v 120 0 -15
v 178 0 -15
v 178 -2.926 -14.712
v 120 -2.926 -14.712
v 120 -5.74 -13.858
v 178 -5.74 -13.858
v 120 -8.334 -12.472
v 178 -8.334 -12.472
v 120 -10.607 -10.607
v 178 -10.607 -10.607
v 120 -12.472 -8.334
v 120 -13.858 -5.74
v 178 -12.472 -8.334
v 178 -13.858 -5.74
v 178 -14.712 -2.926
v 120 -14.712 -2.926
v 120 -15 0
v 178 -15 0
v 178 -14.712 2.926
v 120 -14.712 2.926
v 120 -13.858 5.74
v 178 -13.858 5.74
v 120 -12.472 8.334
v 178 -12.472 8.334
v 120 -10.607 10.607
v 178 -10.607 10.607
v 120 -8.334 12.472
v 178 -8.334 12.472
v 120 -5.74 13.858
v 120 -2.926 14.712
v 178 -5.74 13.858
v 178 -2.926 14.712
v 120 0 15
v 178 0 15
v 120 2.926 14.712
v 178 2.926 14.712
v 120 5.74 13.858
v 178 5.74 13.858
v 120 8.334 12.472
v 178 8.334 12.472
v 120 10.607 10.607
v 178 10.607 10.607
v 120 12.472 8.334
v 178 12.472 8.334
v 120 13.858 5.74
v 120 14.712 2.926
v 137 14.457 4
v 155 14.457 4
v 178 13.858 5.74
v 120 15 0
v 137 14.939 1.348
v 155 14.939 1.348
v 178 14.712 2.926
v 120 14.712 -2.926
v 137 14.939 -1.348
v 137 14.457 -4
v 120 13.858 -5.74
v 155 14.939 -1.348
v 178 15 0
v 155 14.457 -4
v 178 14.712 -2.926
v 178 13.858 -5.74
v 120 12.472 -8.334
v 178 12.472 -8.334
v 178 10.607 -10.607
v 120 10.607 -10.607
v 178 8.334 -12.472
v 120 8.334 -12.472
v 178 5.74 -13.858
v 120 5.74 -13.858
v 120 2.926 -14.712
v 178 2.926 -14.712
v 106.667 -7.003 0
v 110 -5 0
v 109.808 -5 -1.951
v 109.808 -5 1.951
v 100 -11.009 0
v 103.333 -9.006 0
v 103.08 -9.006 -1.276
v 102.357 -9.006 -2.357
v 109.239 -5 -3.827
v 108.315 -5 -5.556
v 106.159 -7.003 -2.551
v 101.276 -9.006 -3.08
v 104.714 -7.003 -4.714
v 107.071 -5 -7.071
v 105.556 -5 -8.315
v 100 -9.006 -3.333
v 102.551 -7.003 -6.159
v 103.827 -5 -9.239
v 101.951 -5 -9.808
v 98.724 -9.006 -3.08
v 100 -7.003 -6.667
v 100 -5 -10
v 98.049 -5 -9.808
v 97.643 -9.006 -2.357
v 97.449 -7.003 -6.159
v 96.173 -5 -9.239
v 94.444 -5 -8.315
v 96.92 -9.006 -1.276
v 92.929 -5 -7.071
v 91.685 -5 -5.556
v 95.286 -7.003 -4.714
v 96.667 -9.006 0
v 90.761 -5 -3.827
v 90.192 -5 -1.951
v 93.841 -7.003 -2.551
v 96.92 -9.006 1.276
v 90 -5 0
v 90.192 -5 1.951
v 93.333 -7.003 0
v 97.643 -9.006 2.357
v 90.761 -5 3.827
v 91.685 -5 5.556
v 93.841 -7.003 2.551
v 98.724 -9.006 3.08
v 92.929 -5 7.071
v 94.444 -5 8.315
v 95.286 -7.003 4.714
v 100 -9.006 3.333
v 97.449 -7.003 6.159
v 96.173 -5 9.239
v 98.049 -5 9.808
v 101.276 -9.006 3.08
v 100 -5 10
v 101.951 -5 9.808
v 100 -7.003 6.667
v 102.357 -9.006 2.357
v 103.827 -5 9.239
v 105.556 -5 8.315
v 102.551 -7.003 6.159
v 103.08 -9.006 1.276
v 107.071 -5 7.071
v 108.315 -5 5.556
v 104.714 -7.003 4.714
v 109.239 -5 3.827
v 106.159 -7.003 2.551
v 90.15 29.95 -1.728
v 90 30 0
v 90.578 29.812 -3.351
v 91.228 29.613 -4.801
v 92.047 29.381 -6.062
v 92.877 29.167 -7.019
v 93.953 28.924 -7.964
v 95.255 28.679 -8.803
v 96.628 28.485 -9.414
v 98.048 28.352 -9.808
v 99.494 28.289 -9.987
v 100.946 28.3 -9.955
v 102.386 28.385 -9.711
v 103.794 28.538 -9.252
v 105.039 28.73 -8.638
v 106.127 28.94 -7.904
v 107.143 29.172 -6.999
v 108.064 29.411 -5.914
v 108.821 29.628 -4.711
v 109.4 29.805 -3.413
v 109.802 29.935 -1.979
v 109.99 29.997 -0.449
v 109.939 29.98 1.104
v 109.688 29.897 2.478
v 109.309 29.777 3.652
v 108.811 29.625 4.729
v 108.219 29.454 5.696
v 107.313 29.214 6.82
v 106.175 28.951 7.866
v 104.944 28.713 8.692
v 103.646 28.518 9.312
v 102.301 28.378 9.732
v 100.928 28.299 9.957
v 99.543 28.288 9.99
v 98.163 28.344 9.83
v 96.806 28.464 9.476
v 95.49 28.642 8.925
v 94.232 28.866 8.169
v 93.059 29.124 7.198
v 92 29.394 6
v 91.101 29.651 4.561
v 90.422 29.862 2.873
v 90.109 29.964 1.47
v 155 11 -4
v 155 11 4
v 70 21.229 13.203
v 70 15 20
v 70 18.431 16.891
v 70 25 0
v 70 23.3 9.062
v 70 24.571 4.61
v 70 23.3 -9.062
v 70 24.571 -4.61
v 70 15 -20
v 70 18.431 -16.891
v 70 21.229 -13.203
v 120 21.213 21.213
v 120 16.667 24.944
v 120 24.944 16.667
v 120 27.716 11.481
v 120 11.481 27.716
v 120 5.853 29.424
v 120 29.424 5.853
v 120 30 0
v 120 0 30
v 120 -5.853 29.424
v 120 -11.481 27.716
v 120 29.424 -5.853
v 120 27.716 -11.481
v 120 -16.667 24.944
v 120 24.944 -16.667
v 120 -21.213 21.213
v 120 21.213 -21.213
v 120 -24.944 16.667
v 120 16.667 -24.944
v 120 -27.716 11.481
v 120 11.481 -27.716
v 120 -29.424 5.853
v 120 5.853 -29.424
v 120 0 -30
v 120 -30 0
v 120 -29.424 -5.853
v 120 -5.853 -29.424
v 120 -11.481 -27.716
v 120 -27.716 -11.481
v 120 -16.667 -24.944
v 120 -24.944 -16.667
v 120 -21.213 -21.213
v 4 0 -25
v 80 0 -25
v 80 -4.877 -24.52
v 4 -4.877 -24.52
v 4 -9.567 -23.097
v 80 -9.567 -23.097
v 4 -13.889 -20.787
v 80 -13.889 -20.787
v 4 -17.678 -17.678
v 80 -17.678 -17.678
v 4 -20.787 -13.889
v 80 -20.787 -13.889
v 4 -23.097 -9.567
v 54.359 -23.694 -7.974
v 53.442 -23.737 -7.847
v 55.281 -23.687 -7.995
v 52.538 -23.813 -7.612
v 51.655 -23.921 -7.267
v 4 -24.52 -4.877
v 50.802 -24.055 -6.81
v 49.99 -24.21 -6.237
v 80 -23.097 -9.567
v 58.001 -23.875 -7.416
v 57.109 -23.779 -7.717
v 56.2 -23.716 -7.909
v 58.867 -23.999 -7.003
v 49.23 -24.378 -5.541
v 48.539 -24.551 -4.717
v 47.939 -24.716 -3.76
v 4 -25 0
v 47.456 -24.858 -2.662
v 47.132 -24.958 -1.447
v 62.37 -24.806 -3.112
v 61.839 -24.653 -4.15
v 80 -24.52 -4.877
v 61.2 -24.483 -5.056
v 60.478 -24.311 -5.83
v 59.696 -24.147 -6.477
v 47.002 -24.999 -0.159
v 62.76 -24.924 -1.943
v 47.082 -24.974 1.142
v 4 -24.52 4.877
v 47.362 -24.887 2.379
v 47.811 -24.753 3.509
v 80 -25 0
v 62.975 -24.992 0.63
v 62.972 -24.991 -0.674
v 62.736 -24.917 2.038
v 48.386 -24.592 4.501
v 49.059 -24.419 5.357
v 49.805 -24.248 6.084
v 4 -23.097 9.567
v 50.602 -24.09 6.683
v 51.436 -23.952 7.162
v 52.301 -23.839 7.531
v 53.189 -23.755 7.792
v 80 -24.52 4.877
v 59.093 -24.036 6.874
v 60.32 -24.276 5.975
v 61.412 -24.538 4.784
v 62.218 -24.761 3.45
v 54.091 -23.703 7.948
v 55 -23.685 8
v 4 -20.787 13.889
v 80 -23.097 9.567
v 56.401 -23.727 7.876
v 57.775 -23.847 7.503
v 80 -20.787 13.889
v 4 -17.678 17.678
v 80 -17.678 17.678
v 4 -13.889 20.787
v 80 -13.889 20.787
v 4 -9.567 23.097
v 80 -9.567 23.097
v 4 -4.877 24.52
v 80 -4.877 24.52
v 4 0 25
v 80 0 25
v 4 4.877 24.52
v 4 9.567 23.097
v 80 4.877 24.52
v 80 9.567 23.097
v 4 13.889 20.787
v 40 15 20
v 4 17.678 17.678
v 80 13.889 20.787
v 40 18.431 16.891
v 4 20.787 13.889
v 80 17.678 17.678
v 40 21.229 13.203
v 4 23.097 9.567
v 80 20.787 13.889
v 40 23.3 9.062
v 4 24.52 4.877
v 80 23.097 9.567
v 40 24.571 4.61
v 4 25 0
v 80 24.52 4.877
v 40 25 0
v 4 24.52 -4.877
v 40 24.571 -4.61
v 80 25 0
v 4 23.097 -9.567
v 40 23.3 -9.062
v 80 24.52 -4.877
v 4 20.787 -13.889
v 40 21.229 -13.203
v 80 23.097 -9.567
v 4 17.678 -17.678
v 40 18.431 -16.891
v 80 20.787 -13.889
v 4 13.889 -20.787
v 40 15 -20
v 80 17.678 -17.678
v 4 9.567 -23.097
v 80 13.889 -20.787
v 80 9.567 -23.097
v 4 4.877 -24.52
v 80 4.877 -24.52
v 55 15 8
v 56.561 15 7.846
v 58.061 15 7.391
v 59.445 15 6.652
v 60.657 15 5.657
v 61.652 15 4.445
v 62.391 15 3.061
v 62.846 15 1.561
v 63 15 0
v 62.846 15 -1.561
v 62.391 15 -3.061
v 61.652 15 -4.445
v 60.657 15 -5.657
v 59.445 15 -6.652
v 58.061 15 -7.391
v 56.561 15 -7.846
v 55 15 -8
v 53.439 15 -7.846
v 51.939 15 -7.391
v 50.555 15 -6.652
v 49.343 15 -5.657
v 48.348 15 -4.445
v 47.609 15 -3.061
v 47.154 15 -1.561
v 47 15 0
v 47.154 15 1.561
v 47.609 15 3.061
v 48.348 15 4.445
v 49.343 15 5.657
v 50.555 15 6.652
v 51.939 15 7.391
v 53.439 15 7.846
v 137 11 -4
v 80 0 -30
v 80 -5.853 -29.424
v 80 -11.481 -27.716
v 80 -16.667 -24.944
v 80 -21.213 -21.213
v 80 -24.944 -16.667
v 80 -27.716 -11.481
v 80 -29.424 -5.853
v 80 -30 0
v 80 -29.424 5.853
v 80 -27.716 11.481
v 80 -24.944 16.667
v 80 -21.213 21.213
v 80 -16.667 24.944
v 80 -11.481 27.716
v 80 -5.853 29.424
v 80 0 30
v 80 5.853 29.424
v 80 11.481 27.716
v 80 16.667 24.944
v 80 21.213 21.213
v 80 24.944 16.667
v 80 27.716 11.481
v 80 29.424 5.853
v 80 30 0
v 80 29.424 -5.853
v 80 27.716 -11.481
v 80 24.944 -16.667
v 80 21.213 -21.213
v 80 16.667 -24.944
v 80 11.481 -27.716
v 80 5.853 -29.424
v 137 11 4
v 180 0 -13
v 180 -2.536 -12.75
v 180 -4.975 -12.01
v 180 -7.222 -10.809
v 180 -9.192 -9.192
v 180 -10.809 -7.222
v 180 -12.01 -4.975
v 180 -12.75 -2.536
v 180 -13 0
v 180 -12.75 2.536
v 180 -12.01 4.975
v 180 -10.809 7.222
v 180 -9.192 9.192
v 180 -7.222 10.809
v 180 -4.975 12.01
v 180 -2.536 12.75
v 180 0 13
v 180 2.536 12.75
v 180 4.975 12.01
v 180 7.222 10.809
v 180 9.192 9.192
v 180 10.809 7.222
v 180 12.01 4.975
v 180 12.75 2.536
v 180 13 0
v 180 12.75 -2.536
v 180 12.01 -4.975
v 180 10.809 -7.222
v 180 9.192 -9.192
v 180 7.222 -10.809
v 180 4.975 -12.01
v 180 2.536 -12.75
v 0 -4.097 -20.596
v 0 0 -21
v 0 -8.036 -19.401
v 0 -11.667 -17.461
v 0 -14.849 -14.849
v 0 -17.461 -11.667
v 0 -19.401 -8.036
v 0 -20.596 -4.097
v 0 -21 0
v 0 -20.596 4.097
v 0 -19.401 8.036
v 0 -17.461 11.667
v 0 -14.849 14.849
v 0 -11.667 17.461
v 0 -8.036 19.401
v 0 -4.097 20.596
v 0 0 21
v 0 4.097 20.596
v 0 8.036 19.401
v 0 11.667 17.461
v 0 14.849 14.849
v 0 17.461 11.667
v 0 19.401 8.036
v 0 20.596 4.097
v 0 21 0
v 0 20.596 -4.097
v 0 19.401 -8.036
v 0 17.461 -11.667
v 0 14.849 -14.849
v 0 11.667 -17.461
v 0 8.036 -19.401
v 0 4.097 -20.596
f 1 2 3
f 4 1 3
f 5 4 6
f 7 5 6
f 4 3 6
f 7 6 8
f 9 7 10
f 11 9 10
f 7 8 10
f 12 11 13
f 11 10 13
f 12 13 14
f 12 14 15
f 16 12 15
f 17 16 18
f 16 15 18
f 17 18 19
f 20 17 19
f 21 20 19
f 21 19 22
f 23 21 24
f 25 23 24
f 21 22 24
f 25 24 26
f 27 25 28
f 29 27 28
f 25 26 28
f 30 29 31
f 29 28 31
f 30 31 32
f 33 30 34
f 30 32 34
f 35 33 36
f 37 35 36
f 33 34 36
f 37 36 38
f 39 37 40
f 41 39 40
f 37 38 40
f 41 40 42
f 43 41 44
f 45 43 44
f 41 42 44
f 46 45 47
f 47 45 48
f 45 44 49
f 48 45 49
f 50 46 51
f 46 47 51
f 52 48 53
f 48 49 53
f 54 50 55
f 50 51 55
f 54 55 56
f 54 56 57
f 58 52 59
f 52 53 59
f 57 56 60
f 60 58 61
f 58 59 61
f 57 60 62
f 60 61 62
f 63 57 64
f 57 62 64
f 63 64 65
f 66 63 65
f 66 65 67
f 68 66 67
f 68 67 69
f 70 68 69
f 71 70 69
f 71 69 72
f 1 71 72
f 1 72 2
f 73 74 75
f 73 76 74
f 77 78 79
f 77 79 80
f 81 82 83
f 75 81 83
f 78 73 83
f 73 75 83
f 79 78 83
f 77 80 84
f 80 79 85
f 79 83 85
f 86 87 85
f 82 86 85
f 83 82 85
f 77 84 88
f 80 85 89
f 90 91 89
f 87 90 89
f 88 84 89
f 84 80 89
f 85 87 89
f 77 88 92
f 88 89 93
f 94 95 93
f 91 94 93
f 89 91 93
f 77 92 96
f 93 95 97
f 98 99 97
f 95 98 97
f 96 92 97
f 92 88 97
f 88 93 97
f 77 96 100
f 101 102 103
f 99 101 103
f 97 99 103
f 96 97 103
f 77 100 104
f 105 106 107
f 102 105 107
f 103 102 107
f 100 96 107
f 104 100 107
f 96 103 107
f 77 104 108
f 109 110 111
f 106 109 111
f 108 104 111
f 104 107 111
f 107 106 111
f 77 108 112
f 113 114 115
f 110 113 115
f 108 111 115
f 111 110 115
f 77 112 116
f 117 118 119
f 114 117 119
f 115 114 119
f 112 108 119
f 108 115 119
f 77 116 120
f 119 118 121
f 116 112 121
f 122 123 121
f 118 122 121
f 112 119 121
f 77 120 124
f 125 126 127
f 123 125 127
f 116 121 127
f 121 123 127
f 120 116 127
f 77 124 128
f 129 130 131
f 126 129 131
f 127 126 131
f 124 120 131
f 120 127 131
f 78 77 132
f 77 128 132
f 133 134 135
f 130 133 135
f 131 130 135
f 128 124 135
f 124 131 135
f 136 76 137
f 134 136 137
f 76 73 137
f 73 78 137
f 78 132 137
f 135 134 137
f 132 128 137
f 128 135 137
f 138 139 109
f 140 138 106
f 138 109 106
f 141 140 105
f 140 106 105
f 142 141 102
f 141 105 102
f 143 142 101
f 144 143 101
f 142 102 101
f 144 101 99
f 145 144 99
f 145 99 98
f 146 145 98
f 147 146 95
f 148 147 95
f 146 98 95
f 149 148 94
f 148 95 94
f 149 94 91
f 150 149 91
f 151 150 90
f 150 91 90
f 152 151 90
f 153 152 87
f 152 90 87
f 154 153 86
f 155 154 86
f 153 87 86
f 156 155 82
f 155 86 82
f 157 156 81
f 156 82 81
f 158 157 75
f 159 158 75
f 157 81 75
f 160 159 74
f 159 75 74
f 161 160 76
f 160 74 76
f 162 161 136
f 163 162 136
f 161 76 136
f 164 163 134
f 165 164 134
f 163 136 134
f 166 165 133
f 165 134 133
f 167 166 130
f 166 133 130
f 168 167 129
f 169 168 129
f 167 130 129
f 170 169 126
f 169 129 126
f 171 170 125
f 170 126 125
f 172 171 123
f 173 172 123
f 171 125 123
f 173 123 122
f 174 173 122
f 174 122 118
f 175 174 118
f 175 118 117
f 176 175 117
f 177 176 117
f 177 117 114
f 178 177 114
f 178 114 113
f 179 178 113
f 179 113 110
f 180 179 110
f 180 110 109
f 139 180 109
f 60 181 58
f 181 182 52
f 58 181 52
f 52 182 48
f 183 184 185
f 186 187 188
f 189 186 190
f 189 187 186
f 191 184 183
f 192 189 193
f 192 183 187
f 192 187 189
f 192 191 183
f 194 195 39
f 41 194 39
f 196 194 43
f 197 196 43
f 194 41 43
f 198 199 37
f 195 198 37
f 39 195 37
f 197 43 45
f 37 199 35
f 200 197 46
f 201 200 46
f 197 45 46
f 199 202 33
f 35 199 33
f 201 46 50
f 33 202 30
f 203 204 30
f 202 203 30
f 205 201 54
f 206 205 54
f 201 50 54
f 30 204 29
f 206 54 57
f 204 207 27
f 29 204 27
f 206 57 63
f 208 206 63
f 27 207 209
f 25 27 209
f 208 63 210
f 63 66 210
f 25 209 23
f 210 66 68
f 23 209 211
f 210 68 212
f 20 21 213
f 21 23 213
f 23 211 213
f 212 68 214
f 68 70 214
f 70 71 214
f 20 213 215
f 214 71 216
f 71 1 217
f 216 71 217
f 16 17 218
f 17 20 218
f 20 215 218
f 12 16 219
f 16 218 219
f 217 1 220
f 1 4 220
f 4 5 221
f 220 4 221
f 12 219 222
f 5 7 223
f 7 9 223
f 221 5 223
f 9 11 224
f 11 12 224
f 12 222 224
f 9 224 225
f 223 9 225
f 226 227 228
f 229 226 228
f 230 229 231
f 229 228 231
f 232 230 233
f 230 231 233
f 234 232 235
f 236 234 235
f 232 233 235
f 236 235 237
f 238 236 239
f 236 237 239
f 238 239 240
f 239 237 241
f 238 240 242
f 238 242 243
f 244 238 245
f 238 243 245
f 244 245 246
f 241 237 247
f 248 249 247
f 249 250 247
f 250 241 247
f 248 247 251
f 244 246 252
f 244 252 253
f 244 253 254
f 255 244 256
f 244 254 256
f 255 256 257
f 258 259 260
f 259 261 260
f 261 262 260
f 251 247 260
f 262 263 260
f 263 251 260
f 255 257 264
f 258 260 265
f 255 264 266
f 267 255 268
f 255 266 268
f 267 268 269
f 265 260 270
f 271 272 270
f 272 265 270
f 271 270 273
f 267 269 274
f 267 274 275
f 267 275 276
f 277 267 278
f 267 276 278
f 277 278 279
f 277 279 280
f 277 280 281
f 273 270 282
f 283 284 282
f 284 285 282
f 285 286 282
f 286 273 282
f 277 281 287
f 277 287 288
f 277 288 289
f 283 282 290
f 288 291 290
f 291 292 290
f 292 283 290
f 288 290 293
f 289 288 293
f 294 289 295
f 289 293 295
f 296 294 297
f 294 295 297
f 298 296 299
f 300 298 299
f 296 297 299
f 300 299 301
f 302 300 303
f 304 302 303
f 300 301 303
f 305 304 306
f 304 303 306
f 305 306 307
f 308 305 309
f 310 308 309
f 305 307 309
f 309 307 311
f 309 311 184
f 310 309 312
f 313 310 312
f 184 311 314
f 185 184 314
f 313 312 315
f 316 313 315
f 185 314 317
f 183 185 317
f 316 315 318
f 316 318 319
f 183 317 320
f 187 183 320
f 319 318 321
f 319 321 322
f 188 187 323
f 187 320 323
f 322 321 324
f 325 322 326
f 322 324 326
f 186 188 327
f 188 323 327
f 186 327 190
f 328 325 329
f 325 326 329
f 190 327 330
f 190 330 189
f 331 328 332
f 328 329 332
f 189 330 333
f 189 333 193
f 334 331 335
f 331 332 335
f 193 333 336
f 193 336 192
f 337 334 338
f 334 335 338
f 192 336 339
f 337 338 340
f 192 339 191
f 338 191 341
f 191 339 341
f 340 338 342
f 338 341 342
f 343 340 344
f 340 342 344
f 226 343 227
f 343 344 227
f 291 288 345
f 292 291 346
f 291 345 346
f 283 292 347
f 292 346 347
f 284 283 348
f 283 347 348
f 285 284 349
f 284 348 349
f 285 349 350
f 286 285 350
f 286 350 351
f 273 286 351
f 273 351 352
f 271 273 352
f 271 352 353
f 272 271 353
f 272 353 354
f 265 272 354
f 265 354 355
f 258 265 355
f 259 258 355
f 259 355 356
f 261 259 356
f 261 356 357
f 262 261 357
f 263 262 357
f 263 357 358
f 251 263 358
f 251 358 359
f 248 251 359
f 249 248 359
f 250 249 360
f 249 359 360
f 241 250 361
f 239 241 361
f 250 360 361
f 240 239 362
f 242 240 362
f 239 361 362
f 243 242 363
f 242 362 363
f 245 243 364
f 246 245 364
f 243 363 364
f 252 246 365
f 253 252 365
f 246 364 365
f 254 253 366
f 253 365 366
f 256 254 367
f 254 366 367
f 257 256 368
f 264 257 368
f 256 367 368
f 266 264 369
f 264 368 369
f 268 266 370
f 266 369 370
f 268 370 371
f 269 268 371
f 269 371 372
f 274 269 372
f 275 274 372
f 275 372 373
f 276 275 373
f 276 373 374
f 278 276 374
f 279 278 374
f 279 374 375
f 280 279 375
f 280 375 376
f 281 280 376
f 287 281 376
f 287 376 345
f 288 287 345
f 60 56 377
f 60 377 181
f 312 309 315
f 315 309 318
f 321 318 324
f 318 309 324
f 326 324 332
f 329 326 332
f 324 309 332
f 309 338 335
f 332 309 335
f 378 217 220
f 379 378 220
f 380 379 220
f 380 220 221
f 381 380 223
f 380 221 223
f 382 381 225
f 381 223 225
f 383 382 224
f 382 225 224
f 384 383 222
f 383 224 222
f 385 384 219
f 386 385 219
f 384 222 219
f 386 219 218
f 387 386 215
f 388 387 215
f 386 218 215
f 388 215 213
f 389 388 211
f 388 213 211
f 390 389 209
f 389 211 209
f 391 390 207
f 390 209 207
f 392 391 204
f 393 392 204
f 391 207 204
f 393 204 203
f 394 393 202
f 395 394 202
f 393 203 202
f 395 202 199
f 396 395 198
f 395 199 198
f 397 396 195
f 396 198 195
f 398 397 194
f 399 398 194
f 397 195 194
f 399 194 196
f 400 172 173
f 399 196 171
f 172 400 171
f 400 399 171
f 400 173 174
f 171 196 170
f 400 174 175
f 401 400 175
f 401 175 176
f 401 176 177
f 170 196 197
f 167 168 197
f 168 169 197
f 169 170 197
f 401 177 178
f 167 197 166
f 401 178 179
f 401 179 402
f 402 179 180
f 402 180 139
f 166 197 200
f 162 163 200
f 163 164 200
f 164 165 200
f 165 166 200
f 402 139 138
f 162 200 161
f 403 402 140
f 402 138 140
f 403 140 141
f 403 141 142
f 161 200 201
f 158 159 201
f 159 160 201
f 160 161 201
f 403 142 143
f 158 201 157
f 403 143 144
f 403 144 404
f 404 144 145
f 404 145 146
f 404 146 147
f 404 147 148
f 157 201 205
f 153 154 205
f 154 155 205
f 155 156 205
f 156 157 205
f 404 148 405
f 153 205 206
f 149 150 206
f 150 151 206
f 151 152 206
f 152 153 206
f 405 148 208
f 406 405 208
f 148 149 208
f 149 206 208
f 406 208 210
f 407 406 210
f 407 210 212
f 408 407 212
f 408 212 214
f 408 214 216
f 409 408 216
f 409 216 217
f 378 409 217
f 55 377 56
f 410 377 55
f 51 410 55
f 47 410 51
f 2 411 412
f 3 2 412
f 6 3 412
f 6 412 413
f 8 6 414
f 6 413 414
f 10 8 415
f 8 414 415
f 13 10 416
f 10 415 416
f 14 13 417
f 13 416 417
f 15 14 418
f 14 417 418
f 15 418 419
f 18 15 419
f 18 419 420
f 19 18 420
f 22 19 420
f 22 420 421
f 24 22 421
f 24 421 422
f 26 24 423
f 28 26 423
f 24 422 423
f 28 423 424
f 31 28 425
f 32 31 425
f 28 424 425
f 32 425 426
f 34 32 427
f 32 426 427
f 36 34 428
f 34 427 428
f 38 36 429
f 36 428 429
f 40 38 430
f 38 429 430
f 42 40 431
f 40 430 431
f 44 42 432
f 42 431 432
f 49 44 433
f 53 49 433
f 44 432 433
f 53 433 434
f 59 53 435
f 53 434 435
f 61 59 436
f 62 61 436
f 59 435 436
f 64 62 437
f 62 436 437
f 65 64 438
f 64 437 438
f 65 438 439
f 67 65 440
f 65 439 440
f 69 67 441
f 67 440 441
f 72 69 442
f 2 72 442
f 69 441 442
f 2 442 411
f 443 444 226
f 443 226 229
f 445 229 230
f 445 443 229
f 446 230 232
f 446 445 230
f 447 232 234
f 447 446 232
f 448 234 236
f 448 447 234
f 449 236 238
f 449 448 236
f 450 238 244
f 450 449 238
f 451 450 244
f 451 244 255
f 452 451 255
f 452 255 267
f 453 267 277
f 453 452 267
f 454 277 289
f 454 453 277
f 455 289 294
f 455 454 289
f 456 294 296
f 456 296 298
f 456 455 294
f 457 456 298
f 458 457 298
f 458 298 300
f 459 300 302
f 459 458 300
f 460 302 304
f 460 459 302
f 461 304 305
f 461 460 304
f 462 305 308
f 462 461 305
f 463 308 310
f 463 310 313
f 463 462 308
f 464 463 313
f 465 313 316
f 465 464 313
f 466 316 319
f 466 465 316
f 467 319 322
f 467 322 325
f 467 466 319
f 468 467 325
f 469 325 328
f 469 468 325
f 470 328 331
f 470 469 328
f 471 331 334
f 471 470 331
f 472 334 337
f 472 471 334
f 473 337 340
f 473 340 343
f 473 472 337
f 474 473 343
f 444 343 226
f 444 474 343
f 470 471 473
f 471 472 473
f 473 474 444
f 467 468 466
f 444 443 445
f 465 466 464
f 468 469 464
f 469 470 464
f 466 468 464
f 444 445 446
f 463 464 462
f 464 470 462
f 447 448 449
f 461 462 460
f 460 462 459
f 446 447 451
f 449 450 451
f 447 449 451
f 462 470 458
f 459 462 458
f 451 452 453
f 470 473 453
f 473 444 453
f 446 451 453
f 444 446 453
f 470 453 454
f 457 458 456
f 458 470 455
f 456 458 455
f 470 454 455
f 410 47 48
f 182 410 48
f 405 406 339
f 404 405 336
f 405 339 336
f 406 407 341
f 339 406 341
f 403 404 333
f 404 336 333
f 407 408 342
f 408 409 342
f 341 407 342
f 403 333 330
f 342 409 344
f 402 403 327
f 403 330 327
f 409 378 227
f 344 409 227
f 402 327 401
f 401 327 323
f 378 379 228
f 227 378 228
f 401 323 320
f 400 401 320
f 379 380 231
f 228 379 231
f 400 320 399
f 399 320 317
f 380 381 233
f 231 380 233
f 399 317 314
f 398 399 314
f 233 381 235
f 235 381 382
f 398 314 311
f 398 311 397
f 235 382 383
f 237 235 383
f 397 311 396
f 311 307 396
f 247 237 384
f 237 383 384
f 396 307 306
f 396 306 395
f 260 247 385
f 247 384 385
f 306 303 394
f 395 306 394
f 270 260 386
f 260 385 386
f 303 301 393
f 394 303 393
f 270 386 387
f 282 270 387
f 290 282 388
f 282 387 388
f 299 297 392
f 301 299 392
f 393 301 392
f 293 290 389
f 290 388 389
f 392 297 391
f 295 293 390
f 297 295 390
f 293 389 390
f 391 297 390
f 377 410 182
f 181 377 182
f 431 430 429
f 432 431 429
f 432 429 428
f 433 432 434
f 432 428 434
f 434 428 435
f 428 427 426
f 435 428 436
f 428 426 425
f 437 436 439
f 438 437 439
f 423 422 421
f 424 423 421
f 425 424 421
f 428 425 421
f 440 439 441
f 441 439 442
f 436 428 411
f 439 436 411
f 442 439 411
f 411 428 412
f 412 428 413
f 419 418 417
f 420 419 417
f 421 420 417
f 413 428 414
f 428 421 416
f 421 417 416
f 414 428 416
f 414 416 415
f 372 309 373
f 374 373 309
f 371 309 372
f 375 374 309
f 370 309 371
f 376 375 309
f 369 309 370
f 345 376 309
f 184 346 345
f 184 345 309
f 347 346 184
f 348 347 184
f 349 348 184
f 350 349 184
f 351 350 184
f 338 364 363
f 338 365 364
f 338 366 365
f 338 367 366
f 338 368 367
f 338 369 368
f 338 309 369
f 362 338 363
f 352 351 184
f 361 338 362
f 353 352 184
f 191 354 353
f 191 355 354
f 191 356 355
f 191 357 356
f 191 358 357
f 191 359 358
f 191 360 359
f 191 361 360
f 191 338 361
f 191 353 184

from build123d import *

# Parameters (mm, degrees)
CUT_EXTRUDE_7_DEPTH         = 185.932420089
CUT_EXTRUDE_7_DEPTH_BACK    = 185.932420089
SKETCH_10_W                 = 30
SKETCH_10_H                 = 10
SKETCH_14_R                 = 8
CUT_EXTRUDE_8_DEPTH         = 188.949461292
SKETCH_6_W                  = 18
SKETCH_6_H                  = 4
CUT_EXTRUDE_4_DEPTH         = 4
HOLE_WIZARD_20_0_20_1_D     = 20
HOLE_WIZARD_20_0_20_1_DEPTH = 35
HOLE_WIZARD_20_0_20_1_TIP   = 6.00860619
CHAMFER_3_SIZE              = 2
CHAMFER_4_SIZE              = 4


with BuildPart() as part:
    # Эскиз1 → Повернуть1 (revolve)
    with BuildSketch(Plane.XY, mode=Mode.PRIVATE) as revolve_1_sk:
        Polygon((0, 0), (0, 25), (80, 25), (80, 30), (120, 30), (120, 15), (180, 15), (180, 0), align=None)
    revolve(revolve_1_sk.sketch.rotate(Axis((0, 0, 0), (-1, 0, 0)), 90), axis=Axis((0, 0, 0), (-1, 0, 0)))

    # Эскиз10 → Вырез-Вытянуть7 (cut, two sides: drawn at the far end of the back side and taken through both)
    with BuildSketch(Plane.XY.offset(-CUT_EXTRUDE_7_DEPTH_BACK)):
        with Locations((55, 20)):
            Rectangle(SKETCH_10_W, SKETCH_10_H)
    extrude(amount=CUT_EXTRUDE_7_DEPTH + CUT_EXTRUDE_7_DEPTH_BACK, mode=Mode.SUBTRACT)

    # Эскиз14 → Вырез-Вытянуть8 (cut, through all)
    with BuildSketch(Plane(origin=(0, 15, 0), x_dir=(1, 0, 0), z_dir=(0, 1, 0))):
        with Locations(Location((55, 0, 0), (0, 0, 270))):
            Circle(SKETCH_14_R)
    extrude(amount=-CUT_EXTRUDE_8_DEPTH, mode=Mode.SUBTRACT)

    # Эскиз6 → Вырез-Вытянуть4 (cut, symmetric)
    with BuildSketch(Plane.XY):
        with Locations((146, 13)):
            Rectangle(SKETCH_6_W, SKETCH_6_H)
    extrude(amount=CUT_EXTRUDE_4_DEPTH, both=True, mode=Mode.SUBTRACT)

    # Диаметр отверстия Ø20.0 (20)1
    with Locations(Plane(origin=(0, 30, 0), x_dir=(1, 0, 0), z_dir=(0, 1, 0))):
        with Locations((100, 0)):
            Hole(HOLE_WIZARD_20_0_20_1_D / 2, depth=HOLE_WIZARD_20_0_20_1_DEPTH)
            with Locations((0, 0, -(HOLE_WIZARD_20_0_20_1_DEPTH + HOLE_WIZARD_20_0_20_1_TIP / 2))):  # 118° drill point
                Cone(0, HOLE_WIZARD_20_0_20_1_D / 2, HOLE_WIZARD_20_0_20_1_TIP, mode=Mode.SUBTRACT)

    # Фаска3
    chamfer_3_edges = [part.edges().sort_by_distance(p)[0] for p in [
        (180, 0, 15),
    ]]
    chamfer(chamfer_3_edges, length=CHAMFER_3_SIZE)

    # Фаска4
    chamfer_4_edges = [part.edges().sort_by_distance(p)[0] for p in [
        (0, 0, 25),
    ]]
    chamfer(chamfer_4_edges, length=CHAMFER_4_SIZE)


solid = part.part
